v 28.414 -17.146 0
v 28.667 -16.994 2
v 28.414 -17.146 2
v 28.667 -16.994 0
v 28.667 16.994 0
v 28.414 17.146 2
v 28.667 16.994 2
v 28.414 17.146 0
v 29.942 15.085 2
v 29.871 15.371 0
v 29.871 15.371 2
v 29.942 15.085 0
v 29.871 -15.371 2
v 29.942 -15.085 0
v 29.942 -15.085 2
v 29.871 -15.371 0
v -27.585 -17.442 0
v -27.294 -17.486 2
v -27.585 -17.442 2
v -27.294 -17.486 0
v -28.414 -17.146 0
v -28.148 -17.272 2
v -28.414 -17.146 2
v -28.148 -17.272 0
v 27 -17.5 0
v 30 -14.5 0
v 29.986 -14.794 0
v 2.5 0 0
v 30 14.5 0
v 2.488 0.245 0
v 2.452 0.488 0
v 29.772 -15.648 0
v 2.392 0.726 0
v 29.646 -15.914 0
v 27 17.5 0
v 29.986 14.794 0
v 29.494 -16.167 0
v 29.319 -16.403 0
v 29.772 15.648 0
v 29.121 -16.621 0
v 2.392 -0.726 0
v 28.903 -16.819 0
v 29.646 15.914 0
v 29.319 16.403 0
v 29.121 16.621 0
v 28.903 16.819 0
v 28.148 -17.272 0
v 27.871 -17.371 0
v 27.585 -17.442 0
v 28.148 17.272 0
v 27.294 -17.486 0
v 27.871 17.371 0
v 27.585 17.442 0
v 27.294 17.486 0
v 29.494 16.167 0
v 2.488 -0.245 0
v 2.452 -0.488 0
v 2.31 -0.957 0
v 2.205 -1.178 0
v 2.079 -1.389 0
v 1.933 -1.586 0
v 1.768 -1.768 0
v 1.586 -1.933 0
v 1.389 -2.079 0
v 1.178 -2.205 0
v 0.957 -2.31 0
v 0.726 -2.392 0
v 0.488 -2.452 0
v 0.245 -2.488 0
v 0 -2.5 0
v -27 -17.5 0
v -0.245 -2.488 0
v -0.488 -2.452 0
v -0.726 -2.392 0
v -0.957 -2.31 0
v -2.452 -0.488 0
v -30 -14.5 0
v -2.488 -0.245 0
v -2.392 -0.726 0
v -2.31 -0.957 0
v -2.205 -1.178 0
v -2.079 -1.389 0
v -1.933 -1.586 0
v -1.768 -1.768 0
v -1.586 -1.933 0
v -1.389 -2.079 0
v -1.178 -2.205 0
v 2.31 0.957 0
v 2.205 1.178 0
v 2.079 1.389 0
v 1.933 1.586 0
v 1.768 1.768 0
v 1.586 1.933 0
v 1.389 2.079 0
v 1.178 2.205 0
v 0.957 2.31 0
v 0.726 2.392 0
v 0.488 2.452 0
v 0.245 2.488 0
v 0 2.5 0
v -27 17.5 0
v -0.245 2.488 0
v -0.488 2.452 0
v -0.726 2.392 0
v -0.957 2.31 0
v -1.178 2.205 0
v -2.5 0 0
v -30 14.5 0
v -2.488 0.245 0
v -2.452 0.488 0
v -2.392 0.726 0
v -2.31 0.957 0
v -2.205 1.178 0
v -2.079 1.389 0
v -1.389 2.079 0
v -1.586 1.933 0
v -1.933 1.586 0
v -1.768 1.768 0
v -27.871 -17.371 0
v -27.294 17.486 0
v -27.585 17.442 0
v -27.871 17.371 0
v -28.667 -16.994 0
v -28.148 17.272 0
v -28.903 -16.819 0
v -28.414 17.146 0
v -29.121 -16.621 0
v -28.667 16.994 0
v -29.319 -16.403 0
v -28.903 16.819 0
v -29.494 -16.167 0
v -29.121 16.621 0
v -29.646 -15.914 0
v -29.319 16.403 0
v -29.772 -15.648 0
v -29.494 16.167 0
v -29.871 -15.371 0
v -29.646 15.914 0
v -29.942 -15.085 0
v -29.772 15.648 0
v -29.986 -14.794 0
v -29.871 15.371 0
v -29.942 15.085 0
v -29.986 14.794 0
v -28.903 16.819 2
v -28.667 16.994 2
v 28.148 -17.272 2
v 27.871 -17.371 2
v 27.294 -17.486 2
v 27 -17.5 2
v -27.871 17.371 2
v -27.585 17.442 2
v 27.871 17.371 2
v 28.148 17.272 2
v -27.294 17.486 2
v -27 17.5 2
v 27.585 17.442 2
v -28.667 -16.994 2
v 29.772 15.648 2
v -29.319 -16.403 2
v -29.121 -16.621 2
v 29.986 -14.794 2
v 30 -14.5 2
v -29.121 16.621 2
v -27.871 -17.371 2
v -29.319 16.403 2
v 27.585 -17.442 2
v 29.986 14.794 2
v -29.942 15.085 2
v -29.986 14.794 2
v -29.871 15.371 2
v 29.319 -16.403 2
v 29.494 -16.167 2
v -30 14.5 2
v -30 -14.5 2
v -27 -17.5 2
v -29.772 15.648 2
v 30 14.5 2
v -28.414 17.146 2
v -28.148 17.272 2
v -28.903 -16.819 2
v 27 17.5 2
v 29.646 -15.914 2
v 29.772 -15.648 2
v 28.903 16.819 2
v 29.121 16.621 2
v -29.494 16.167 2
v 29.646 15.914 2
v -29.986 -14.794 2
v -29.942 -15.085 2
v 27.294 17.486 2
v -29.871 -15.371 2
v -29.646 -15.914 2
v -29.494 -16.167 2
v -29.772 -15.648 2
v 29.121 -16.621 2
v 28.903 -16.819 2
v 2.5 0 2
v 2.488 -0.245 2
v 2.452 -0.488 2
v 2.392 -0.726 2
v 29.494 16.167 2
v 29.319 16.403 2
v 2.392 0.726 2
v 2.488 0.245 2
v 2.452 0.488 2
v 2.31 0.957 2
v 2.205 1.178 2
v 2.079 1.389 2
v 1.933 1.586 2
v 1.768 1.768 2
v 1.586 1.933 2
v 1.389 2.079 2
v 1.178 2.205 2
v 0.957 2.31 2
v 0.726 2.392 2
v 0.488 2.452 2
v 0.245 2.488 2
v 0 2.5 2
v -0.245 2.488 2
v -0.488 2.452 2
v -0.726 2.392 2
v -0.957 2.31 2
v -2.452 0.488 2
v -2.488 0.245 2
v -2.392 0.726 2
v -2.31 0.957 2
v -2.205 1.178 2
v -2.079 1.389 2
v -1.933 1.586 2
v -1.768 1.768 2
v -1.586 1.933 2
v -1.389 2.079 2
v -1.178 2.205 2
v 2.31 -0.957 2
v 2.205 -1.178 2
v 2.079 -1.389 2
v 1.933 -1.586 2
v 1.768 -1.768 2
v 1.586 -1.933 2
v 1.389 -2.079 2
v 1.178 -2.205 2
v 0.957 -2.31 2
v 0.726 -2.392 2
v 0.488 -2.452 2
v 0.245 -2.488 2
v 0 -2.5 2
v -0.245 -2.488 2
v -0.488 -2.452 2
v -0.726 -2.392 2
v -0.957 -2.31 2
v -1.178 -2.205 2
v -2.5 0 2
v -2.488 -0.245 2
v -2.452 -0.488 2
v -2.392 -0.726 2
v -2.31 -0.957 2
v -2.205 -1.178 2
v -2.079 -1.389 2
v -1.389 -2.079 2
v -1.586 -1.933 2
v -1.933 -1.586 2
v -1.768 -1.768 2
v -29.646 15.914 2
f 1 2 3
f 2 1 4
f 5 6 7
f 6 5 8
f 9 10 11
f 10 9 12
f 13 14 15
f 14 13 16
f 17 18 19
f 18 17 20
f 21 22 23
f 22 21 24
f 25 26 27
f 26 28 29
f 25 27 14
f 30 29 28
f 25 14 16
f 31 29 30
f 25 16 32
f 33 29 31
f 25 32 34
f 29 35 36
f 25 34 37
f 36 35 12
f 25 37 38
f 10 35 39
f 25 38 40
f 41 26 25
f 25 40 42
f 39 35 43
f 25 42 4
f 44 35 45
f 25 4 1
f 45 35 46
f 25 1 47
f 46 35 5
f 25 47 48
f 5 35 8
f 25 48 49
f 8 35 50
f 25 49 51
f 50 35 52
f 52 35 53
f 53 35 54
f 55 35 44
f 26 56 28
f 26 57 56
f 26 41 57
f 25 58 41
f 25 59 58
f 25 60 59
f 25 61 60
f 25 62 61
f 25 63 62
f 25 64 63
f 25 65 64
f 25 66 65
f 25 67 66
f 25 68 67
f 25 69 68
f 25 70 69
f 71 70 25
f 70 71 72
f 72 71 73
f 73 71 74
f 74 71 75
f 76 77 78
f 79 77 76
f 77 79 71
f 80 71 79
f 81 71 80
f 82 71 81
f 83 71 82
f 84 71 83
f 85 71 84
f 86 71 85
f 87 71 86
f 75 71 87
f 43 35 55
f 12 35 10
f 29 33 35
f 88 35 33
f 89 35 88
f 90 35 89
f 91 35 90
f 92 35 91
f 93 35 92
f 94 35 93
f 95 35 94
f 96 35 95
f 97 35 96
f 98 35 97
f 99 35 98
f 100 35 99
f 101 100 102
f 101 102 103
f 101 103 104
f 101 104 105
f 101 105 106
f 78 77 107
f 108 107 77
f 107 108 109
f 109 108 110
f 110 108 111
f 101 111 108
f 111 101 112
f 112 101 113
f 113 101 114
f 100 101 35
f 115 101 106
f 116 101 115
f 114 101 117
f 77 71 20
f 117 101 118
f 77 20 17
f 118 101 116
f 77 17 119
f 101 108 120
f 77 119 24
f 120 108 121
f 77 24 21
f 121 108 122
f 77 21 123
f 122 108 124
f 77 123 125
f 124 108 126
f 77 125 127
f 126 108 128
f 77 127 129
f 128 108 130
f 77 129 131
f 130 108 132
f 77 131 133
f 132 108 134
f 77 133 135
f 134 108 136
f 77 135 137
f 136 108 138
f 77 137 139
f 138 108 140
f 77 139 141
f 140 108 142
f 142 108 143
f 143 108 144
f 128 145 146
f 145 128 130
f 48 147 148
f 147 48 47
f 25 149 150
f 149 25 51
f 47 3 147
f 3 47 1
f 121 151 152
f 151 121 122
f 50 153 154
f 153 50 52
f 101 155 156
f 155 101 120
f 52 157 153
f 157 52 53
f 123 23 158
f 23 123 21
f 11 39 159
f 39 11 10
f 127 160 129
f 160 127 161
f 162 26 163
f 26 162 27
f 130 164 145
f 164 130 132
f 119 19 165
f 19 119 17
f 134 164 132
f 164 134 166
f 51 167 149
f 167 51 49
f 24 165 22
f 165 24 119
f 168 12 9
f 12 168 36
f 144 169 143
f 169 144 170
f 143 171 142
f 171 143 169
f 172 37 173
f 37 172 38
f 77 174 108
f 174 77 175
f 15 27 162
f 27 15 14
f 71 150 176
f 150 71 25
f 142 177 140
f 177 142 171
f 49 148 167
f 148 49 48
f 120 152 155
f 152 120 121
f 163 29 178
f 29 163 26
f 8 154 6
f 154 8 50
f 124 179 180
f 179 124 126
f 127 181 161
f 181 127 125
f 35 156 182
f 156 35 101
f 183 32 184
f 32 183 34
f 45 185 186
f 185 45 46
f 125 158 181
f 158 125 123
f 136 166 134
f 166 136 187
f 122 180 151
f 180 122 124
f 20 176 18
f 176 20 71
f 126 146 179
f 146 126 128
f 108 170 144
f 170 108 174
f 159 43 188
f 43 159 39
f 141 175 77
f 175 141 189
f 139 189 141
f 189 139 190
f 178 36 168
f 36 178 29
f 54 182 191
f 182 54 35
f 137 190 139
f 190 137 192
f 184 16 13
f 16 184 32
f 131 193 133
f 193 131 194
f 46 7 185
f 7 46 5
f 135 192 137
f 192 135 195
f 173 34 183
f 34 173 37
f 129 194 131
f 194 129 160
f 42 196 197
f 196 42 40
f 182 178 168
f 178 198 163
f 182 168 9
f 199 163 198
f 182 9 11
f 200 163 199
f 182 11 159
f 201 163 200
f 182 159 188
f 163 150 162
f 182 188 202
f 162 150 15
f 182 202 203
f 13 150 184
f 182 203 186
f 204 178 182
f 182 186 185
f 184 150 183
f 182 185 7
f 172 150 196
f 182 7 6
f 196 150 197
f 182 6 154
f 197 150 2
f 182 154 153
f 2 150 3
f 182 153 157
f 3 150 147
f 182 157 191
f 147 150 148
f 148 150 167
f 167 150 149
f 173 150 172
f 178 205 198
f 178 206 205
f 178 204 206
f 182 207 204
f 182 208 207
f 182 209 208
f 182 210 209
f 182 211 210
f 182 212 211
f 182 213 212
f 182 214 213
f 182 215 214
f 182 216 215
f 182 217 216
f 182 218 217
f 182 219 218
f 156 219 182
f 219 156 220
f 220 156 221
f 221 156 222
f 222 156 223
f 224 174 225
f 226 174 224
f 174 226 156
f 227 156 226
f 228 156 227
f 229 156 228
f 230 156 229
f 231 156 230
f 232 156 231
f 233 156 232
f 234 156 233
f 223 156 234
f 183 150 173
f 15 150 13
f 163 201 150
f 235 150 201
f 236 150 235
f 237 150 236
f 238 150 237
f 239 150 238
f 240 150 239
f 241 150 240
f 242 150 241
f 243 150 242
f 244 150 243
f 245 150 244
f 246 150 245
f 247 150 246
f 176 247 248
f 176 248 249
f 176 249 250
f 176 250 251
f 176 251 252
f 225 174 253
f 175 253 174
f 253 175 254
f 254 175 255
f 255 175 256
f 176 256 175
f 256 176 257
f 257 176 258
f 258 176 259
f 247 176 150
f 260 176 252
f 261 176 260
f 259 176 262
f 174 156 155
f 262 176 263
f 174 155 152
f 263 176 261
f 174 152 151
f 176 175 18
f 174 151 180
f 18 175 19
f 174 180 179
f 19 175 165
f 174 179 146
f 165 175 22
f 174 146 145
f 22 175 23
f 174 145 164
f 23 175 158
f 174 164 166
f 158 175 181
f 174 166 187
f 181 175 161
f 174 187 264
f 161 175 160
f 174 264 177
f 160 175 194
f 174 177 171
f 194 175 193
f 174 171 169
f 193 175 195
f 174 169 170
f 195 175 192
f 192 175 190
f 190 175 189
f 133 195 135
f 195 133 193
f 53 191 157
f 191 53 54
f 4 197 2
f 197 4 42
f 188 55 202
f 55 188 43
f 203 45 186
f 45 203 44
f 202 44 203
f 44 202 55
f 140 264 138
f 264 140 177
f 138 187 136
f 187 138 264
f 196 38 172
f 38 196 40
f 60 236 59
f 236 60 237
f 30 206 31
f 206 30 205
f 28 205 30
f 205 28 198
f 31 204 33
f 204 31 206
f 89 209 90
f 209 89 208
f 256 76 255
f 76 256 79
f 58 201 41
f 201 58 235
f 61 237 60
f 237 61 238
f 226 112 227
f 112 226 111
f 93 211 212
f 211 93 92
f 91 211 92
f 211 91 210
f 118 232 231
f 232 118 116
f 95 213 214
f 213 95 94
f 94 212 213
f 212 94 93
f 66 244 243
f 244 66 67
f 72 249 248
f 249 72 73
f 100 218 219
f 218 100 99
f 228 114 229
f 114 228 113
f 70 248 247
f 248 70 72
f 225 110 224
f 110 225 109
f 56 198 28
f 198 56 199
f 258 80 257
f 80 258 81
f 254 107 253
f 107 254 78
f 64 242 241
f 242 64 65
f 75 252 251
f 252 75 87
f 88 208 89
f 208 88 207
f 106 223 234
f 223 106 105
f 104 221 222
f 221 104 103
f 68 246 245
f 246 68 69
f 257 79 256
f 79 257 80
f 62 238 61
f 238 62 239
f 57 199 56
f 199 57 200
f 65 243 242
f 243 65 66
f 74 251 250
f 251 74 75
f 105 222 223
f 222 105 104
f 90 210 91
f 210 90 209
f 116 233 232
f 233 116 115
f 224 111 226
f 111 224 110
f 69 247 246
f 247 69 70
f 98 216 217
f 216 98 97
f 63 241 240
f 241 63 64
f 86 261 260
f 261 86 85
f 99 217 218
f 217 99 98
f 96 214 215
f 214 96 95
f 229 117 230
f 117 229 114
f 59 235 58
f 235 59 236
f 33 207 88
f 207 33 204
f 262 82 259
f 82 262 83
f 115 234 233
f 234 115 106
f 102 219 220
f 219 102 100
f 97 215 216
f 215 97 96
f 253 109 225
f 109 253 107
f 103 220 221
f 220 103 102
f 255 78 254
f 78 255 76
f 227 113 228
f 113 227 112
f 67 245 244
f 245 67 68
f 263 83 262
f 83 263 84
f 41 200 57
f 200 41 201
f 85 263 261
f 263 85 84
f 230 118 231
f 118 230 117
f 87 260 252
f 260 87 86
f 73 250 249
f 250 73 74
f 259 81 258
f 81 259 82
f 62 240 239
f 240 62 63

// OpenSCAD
/* [Swatch Dimensions] */
// Total height of the swatch
height = 35; // [10:1:100]
// Total width of the swatch
width = 60; // [10:1:150]
// Thickness of the swatch
thickness = 2; // [0.4:0.2:10]
// Corner radius
corner_radius = 3; // [0:0.5:15]

/* [Hole] */
// Diameter of the hanging hole
hole_diameter = 5; // [2:0.5:20]
// Distance from hole center to nearest edge
hole_edge_distance = 5; // [2:0.5:30]
// Hole position on the swatch
hole_position = "center"; // [center, top]

/* [Hidden] */
$fn = 64;

module rounded_rect(w, h, t, r) {
    r = min(r, min(w, h) / 2);
    linear_extrude(t)
        offset(r)
            square([w - 2 * r, h - 2 * r], center = true);
}

module swatch() {
    hole_r = hole_diameter / 2;

    hole_x = 0;
    hole_y = (hole_position == "top")
        ? height / 2 - hole_edge_distance
        : 0;

    difference() {
        rounded_rect(width, height, thickness, corner_radius);
        translate([hole_x, hole_y, -0.5])
            cylinder(h = thickness + 1, r = hole_r);
    }
}

swatch();
